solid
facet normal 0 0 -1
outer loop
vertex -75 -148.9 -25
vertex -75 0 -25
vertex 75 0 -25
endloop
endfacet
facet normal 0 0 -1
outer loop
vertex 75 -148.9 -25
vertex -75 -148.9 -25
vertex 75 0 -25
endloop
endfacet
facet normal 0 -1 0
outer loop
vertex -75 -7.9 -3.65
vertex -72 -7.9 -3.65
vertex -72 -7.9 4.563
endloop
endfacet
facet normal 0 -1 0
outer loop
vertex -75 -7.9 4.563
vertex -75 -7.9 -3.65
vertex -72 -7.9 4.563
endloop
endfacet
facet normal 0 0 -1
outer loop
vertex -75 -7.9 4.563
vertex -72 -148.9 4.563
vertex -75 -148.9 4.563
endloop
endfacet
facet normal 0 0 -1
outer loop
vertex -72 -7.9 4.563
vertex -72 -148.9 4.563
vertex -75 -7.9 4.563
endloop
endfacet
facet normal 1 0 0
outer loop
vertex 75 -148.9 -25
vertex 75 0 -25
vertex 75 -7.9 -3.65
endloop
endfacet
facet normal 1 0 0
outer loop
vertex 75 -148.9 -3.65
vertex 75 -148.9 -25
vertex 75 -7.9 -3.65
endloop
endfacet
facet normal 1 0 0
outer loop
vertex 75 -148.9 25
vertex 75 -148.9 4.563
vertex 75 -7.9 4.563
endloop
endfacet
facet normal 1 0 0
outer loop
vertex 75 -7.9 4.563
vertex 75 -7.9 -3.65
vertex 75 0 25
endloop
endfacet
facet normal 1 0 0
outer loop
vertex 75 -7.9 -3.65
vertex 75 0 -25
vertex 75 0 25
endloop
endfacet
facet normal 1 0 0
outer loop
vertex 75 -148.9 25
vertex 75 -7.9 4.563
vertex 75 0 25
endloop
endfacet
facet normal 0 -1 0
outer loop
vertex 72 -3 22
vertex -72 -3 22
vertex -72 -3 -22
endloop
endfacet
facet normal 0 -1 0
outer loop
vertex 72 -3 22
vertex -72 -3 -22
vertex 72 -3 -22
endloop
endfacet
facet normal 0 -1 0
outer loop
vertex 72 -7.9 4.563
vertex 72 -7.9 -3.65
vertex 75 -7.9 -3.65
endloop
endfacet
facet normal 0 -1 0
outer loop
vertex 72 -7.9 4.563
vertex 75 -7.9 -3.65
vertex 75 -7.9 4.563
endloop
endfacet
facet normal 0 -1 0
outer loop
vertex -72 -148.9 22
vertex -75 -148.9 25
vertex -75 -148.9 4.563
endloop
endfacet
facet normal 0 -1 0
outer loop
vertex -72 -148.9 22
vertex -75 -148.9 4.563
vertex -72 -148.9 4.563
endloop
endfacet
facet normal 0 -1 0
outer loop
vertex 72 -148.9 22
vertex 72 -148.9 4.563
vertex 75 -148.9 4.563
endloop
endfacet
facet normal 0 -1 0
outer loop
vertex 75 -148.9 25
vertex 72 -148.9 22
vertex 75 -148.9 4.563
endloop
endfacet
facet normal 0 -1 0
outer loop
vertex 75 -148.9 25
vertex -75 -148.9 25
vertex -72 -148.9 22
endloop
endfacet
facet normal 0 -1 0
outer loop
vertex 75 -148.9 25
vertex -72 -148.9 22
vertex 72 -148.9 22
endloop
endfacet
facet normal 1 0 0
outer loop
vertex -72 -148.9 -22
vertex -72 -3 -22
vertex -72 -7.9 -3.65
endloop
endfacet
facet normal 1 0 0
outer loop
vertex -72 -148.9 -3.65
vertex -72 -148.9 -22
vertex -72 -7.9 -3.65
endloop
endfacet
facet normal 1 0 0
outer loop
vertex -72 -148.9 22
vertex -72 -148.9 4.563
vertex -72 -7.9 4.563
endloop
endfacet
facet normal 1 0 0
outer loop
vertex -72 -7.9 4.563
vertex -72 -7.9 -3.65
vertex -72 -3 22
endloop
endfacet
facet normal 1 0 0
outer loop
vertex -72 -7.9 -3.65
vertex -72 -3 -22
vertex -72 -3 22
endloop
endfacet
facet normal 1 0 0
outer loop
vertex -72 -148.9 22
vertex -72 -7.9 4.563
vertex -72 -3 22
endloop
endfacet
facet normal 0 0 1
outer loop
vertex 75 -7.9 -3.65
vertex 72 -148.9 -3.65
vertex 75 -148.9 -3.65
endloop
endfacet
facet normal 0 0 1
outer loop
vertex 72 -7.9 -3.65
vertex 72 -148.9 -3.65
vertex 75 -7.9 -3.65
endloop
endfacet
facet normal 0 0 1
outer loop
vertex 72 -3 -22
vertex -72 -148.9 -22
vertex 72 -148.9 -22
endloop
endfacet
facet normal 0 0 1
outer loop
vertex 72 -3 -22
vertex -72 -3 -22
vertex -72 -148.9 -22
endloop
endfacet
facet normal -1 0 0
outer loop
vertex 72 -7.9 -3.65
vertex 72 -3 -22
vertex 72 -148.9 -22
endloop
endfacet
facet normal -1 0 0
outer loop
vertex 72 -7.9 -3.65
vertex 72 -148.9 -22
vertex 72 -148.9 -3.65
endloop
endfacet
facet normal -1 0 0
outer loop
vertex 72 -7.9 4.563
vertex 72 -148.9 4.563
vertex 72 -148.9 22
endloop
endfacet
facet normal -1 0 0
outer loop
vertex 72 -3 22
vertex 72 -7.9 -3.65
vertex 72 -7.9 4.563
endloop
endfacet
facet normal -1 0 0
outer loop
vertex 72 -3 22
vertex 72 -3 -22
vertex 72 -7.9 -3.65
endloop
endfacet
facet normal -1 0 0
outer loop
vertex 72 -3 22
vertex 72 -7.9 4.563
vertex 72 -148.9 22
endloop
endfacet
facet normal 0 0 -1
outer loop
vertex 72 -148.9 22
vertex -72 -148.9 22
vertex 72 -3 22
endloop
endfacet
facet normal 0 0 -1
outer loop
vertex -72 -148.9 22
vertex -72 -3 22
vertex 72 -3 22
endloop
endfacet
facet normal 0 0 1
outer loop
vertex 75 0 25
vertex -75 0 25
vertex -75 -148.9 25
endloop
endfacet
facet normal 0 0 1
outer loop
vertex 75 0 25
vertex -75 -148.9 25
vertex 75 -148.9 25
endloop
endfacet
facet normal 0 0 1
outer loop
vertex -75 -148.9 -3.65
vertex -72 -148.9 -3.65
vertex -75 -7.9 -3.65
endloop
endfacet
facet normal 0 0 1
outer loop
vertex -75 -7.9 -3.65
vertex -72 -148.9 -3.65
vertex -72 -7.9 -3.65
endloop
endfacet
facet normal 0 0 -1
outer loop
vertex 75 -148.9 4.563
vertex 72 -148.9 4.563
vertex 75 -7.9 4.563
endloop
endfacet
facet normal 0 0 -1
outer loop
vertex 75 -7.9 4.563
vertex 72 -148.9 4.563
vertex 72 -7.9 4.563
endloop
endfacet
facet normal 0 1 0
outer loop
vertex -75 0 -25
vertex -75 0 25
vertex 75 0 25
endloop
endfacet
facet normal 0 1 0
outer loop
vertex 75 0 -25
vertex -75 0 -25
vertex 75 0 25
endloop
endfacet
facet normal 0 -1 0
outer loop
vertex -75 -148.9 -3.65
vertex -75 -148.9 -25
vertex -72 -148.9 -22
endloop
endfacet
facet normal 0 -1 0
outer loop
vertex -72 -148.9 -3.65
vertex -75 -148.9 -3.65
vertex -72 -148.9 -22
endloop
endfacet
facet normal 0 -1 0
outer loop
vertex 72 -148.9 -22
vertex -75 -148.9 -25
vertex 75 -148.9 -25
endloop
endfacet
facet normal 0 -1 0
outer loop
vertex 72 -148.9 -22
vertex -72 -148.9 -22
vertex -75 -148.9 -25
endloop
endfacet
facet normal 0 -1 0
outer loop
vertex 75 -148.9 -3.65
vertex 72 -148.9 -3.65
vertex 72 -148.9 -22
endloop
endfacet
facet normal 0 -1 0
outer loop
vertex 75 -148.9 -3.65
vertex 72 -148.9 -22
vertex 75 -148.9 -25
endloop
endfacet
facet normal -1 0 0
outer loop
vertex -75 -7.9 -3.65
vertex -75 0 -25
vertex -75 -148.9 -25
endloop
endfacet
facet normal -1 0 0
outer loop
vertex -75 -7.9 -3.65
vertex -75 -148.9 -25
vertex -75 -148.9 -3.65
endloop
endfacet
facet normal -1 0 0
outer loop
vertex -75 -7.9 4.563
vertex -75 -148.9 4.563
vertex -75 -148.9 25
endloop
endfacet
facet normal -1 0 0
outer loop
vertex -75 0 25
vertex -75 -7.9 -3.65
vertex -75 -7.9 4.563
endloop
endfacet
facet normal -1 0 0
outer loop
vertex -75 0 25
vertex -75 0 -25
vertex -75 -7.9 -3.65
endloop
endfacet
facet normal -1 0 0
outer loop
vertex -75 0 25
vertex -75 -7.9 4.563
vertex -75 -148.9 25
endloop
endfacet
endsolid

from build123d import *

# Parameters (mm, degrees)
F0_W          = 150
F0_H          = 50
F1_DEPTH      = 148.9
F2_T          = -3
F3_W          = 149.098023
F3_H          = 8.212631
F4_DEPTH      = 98.5
F4_DEPTH_BACK = 98.4


with BuildPart() as f1:
    # F0 (on Front) → F1 (new body)
    with BuildSketch(Plane.XZ):
        Rectangle(F0_W, F0_H)
    extrude(amount=F1_DEPTH)

    # F2
    f2_openings = [f1.faces().sort_by_distance(p)[0] for p in [
        (0, -148.9, 0),
    ]]
    offset(amount=F2_T, openings=f2_openings)

    # F3 (on Right) → F4 (cut, two sides)
    with BuildSketch(Plane.YZ) as f4_sk:
        with Locations((-82.449026, 0.456257)):
            Rectangle(F3_W, F3_H)
    extrude(amount=F4_DEPTH, mode=Mode.SUBTRACT)
    extrude(f4_sk.sketch, amount=-F4_DEPTH_BACK, mode=Mode.SUBTRACT)


solid = f1.part
